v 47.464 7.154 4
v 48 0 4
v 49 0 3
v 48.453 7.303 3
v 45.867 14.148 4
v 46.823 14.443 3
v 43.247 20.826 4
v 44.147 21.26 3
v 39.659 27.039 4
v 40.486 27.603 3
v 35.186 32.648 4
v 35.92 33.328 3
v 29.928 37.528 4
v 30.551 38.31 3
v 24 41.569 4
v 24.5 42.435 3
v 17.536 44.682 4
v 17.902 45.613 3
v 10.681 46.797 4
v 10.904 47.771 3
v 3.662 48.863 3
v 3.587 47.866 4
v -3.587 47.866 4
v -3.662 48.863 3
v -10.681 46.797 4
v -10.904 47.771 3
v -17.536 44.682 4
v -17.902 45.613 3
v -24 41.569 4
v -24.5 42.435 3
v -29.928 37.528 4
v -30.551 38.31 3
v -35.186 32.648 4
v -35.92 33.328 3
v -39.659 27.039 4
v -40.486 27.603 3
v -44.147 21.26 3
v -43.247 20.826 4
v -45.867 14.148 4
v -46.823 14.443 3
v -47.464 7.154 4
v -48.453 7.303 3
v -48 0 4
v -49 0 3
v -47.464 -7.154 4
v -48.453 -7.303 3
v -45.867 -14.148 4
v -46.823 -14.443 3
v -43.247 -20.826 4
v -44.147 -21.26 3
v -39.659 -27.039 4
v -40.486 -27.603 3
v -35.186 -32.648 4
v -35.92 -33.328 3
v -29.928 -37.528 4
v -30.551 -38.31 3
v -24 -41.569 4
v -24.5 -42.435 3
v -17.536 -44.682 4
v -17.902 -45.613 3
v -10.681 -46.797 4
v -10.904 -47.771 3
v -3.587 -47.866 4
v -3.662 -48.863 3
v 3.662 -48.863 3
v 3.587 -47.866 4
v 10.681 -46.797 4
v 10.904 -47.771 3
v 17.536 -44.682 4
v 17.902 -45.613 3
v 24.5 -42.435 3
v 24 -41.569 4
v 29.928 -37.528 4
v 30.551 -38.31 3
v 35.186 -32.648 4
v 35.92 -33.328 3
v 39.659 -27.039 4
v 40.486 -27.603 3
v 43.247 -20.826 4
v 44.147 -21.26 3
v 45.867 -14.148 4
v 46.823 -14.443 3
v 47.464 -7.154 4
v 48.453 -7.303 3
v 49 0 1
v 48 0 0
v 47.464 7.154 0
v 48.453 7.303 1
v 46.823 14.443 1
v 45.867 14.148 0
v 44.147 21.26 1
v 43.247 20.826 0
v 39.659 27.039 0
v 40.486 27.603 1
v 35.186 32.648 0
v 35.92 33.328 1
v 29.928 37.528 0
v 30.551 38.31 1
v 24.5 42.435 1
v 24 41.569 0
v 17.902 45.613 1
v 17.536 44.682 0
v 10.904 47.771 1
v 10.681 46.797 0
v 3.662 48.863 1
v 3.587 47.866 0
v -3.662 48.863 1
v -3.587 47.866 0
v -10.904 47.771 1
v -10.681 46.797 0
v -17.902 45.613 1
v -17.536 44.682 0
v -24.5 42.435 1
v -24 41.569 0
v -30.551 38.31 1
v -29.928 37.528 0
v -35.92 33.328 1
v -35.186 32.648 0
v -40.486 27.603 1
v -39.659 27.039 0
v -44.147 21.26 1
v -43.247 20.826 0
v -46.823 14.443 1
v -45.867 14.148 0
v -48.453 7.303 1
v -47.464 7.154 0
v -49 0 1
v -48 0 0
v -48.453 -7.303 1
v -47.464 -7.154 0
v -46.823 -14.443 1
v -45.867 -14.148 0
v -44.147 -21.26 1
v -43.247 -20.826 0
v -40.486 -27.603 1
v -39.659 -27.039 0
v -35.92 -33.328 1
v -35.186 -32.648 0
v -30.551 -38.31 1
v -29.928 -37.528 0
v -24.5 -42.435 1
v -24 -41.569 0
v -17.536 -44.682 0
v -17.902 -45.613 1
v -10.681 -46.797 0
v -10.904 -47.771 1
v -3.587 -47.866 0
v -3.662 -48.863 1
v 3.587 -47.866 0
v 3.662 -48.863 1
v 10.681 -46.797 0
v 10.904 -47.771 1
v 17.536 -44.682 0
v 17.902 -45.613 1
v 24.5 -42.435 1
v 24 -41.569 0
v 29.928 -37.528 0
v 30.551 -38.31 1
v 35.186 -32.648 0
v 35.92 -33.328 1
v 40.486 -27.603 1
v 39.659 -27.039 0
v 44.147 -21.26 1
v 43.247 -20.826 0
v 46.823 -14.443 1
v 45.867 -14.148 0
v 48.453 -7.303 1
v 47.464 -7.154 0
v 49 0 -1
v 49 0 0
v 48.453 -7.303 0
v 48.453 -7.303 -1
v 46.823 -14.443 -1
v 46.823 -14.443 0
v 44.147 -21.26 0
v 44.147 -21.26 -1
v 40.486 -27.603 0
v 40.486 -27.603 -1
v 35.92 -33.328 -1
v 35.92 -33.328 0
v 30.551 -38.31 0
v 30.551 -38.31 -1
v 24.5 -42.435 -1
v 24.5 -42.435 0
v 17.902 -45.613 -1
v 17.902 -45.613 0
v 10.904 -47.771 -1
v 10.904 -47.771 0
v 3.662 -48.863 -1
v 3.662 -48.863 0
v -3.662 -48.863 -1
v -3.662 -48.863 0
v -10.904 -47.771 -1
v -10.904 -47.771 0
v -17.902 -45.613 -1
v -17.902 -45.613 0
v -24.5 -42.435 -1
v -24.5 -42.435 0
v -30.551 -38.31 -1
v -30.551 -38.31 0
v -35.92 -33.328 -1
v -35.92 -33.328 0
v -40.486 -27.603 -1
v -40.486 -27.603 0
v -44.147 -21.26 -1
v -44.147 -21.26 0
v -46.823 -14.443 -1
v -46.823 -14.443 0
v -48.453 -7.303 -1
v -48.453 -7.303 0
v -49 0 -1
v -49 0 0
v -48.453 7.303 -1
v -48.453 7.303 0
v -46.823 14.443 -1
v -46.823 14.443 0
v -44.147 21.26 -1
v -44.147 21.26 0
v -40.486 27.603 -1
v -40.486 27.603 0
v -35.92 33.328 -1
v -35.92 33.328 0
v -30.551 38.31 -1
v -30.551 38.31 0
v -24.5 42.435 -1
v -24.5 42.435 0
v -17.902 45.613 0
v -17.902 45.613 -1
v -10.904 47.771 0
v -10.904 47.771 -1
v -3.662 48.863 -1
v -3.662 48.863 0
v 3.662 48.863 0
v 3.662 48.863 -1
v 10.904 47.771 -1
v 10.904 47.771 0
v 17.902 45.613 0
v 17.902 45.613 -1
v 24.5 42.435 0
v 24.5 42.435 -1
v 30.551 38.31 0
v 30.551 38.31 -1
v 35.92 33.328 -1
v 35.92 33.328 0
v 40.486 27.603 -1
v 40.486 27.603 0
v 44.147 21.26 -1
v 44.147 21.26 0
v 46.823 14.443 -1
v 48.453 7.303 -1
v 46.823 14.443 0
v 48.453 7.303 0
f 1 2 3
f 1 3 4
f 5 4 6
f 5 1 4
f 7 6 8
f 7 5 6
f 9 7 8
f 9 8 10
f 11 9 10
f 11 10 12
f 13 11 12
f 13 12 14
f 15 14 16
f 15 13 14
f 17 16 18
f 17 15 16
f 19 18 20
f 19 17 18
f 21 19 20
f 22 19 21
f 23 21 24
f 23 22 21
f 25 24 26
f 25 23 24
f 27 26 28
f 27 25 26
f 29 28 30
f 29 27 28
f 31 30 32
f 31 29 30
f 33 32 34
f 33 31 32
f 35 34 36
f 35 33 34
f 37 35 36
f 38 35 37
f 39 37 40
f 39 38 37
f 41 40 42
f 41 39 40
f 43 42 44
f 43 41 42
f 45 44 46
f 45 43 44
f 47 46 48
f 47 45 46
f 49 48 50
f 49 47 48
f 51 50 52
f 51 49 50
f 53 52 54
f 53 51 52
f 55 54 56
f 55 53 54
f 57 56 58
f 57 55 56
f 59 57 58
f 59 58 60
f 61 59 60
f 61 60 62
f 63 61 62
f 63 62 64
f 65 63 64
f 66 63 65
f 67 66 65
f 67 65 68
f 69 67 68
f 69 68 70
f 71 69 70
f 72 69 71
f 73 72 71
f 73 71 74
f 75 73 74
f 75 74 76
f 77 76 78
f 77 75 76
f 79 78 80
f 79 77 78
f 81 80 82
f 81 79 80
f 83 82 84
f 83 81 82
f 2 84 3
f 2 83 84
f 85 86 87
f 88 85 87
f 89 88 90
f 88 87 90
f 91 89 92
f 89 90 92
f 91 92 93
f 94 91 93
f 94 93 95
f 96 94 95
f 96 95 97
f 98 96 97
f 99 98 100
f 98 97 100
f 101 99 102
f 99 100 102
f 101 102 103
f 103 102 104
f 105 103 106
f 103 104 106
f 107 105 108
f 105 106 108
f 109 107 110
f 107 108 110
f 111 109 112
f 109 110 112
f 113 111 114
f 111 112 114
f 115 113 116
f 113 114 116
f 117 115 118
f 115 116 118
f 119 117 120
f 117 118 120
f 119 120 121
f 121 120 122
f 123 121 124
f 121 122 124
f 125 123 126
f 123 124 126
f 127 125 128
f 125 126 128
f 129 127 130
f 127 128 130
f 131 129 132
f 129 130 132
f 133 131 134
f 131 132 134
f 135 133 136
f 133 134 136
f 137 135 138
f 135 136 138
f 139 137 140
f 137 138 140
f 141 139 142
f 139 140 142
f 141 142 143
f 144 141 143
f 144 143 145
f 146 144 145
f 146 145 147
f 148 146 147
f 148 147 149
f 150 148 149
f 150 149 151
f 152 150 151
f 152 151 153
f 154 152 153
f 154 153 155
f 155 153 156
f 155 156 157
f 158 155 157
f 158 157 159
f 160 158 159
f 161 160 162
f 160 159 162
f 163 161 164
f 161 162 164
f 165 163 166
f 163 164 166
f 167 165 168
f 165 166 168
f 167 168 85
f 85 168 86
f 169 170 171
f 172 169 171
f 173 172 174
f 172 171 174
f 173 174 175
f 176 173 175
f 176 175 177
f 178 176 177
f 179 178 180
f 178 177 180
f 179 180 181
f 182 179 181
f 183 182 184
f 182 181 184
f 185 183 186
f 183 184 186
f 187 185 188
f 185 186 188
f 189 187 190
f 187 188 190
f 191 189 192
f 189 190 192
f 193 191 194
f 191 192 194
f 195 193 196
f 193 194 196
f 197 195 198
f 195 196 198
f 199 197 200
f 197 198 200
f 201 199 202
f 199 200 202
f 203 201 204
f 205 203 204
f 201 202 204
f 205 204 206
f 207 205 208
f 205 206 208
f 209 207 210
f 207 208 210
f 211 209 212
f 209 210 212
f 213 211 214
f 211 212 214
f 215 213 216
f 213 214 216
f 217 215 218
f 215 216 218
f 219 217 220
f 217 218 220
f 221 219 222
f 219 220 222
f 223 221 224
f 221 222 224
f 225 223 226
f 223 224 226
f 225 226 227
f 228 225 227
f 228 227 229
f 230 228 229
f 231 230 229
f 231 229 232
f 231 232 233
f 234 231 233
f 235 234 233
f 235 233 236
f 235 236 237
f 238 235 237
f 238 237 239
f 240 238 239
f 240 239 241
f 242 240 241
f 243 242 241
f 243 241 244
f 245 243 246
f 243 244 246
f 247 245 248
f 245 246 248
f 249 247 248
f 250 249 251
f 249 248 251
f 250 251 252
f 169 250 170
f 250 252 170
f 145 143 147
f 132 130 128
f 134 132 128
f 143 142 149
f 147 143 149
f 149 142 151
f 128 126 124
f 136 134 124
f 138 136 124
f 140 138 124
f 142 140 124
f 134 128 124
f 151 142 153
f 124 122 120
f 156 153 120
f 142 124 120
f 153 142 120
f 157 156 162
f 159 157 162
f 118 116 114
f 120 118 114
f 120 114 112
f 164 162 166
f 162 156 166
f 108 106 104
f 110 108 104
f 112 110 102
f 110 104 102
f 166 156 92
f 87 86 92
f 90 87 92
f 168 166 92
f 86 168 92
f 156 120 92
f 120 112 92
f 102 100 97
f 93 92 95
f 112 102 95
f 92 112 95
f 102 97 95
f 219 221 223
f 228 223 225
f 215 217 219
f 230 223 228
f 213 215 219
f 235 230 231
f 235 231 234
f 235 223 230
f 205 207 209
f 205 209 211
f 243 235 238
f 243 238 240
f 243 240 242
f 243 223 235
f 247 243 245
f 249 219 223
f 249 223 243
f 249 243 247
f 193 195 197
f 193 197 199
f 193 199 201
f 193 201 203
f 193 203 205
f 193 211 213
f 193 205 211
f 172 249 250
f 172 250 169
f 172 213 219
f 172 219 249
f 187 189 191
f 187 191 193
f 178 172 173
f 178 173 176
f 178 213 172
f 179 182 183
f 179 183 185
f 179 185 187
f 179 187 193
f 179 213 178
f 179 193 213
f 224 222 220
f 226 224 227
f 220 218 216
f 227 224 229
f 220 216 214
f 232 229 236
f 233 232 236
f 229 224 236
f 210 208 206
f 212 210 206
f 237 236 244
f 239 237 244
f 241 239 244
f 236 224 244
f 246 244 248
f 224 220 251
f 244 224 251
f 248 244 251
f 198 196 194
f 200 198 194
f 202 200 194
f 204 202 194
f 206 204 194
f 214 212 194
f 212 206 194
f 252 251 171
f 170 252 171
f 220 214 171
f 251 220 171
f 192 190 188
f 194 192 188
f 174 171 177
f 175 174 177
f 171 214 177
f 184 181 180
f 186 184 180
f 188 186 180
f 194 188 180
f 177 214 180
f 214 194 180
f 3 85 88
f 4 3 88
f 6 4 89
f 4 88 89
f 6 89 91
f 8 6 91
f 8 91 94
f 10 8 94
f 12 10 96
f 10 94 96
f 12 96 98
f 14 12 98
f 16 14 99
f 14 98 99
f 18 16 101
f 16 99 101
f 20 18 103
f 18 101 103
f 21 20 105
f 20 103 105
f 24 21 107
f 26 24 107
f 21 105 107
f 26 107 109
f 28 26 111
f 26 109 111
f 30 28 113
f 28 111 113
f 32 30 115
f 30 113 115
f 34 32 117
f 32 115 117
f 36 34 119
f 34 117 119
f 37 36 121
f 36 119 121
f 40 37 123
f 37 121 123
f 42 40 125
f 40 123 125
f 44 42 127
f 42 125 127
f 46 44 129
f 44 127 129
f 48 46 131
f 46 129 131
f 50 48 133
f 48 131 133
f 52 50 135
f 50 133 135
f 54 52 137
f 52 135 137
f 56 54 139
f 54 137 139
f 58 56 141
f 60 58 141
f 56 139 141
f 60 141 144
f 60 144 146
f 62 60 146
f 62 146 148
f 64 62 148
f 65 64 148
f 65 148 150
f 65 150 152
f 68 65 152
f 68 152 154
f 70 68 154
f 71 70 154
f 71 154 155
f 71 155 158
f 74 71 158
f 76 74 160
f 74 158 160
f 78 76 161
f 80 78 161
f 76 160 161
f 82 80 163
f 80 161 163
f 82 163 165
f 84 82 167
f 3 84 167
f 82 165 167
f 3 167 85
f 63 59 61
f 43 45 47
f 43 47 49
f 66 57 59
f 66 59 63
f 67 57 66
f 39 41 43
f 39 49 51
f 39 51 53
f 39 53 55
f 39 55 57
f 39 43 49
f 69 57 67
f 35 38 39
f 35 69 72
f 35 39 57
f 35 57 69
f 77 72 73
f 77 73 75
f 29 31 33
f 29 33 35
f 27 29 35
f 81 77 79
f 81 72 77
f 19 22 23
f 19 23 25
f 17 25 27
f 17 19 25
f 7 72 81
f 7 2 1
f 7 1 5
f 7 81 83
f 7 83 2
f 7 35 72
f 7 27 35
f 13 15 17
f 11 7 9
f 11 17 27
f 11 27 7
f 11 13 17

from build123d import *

# Parameters (mm, degrees)
F0_R     = 49
F1_DEPTH = 4
F2_SIZE  = 1
F3_R     = 49
F4_DEPTH = 1


with BuildPart() as f1:
    # F0 (on Top) → F1 (new body)
    with BuildSketch(Plane.XY):
        Circle(F0_R)
    extrude(amount=F1_DEPTH)

    # F2
    f2_edges = [f1.edges().sort_by_distance(p)[0] for p in [
        (-49, 0, 4),
        (-49, 0, 0),
    ]]
    chamfer(f2_edges, length=F2_SIZE)


with BuildPart() as f4:
    # F3 (on face) → F4 (new body)
    with BuildSketch(Plane(origin=(0, 0, 0), x_dir=(1, 0, 0), z_dir=(0, 0, -1))):
        Circle(F3_R)
    extrude(amount=F4_DEPTH)


solid = Compound([f1.part, f4.part])
